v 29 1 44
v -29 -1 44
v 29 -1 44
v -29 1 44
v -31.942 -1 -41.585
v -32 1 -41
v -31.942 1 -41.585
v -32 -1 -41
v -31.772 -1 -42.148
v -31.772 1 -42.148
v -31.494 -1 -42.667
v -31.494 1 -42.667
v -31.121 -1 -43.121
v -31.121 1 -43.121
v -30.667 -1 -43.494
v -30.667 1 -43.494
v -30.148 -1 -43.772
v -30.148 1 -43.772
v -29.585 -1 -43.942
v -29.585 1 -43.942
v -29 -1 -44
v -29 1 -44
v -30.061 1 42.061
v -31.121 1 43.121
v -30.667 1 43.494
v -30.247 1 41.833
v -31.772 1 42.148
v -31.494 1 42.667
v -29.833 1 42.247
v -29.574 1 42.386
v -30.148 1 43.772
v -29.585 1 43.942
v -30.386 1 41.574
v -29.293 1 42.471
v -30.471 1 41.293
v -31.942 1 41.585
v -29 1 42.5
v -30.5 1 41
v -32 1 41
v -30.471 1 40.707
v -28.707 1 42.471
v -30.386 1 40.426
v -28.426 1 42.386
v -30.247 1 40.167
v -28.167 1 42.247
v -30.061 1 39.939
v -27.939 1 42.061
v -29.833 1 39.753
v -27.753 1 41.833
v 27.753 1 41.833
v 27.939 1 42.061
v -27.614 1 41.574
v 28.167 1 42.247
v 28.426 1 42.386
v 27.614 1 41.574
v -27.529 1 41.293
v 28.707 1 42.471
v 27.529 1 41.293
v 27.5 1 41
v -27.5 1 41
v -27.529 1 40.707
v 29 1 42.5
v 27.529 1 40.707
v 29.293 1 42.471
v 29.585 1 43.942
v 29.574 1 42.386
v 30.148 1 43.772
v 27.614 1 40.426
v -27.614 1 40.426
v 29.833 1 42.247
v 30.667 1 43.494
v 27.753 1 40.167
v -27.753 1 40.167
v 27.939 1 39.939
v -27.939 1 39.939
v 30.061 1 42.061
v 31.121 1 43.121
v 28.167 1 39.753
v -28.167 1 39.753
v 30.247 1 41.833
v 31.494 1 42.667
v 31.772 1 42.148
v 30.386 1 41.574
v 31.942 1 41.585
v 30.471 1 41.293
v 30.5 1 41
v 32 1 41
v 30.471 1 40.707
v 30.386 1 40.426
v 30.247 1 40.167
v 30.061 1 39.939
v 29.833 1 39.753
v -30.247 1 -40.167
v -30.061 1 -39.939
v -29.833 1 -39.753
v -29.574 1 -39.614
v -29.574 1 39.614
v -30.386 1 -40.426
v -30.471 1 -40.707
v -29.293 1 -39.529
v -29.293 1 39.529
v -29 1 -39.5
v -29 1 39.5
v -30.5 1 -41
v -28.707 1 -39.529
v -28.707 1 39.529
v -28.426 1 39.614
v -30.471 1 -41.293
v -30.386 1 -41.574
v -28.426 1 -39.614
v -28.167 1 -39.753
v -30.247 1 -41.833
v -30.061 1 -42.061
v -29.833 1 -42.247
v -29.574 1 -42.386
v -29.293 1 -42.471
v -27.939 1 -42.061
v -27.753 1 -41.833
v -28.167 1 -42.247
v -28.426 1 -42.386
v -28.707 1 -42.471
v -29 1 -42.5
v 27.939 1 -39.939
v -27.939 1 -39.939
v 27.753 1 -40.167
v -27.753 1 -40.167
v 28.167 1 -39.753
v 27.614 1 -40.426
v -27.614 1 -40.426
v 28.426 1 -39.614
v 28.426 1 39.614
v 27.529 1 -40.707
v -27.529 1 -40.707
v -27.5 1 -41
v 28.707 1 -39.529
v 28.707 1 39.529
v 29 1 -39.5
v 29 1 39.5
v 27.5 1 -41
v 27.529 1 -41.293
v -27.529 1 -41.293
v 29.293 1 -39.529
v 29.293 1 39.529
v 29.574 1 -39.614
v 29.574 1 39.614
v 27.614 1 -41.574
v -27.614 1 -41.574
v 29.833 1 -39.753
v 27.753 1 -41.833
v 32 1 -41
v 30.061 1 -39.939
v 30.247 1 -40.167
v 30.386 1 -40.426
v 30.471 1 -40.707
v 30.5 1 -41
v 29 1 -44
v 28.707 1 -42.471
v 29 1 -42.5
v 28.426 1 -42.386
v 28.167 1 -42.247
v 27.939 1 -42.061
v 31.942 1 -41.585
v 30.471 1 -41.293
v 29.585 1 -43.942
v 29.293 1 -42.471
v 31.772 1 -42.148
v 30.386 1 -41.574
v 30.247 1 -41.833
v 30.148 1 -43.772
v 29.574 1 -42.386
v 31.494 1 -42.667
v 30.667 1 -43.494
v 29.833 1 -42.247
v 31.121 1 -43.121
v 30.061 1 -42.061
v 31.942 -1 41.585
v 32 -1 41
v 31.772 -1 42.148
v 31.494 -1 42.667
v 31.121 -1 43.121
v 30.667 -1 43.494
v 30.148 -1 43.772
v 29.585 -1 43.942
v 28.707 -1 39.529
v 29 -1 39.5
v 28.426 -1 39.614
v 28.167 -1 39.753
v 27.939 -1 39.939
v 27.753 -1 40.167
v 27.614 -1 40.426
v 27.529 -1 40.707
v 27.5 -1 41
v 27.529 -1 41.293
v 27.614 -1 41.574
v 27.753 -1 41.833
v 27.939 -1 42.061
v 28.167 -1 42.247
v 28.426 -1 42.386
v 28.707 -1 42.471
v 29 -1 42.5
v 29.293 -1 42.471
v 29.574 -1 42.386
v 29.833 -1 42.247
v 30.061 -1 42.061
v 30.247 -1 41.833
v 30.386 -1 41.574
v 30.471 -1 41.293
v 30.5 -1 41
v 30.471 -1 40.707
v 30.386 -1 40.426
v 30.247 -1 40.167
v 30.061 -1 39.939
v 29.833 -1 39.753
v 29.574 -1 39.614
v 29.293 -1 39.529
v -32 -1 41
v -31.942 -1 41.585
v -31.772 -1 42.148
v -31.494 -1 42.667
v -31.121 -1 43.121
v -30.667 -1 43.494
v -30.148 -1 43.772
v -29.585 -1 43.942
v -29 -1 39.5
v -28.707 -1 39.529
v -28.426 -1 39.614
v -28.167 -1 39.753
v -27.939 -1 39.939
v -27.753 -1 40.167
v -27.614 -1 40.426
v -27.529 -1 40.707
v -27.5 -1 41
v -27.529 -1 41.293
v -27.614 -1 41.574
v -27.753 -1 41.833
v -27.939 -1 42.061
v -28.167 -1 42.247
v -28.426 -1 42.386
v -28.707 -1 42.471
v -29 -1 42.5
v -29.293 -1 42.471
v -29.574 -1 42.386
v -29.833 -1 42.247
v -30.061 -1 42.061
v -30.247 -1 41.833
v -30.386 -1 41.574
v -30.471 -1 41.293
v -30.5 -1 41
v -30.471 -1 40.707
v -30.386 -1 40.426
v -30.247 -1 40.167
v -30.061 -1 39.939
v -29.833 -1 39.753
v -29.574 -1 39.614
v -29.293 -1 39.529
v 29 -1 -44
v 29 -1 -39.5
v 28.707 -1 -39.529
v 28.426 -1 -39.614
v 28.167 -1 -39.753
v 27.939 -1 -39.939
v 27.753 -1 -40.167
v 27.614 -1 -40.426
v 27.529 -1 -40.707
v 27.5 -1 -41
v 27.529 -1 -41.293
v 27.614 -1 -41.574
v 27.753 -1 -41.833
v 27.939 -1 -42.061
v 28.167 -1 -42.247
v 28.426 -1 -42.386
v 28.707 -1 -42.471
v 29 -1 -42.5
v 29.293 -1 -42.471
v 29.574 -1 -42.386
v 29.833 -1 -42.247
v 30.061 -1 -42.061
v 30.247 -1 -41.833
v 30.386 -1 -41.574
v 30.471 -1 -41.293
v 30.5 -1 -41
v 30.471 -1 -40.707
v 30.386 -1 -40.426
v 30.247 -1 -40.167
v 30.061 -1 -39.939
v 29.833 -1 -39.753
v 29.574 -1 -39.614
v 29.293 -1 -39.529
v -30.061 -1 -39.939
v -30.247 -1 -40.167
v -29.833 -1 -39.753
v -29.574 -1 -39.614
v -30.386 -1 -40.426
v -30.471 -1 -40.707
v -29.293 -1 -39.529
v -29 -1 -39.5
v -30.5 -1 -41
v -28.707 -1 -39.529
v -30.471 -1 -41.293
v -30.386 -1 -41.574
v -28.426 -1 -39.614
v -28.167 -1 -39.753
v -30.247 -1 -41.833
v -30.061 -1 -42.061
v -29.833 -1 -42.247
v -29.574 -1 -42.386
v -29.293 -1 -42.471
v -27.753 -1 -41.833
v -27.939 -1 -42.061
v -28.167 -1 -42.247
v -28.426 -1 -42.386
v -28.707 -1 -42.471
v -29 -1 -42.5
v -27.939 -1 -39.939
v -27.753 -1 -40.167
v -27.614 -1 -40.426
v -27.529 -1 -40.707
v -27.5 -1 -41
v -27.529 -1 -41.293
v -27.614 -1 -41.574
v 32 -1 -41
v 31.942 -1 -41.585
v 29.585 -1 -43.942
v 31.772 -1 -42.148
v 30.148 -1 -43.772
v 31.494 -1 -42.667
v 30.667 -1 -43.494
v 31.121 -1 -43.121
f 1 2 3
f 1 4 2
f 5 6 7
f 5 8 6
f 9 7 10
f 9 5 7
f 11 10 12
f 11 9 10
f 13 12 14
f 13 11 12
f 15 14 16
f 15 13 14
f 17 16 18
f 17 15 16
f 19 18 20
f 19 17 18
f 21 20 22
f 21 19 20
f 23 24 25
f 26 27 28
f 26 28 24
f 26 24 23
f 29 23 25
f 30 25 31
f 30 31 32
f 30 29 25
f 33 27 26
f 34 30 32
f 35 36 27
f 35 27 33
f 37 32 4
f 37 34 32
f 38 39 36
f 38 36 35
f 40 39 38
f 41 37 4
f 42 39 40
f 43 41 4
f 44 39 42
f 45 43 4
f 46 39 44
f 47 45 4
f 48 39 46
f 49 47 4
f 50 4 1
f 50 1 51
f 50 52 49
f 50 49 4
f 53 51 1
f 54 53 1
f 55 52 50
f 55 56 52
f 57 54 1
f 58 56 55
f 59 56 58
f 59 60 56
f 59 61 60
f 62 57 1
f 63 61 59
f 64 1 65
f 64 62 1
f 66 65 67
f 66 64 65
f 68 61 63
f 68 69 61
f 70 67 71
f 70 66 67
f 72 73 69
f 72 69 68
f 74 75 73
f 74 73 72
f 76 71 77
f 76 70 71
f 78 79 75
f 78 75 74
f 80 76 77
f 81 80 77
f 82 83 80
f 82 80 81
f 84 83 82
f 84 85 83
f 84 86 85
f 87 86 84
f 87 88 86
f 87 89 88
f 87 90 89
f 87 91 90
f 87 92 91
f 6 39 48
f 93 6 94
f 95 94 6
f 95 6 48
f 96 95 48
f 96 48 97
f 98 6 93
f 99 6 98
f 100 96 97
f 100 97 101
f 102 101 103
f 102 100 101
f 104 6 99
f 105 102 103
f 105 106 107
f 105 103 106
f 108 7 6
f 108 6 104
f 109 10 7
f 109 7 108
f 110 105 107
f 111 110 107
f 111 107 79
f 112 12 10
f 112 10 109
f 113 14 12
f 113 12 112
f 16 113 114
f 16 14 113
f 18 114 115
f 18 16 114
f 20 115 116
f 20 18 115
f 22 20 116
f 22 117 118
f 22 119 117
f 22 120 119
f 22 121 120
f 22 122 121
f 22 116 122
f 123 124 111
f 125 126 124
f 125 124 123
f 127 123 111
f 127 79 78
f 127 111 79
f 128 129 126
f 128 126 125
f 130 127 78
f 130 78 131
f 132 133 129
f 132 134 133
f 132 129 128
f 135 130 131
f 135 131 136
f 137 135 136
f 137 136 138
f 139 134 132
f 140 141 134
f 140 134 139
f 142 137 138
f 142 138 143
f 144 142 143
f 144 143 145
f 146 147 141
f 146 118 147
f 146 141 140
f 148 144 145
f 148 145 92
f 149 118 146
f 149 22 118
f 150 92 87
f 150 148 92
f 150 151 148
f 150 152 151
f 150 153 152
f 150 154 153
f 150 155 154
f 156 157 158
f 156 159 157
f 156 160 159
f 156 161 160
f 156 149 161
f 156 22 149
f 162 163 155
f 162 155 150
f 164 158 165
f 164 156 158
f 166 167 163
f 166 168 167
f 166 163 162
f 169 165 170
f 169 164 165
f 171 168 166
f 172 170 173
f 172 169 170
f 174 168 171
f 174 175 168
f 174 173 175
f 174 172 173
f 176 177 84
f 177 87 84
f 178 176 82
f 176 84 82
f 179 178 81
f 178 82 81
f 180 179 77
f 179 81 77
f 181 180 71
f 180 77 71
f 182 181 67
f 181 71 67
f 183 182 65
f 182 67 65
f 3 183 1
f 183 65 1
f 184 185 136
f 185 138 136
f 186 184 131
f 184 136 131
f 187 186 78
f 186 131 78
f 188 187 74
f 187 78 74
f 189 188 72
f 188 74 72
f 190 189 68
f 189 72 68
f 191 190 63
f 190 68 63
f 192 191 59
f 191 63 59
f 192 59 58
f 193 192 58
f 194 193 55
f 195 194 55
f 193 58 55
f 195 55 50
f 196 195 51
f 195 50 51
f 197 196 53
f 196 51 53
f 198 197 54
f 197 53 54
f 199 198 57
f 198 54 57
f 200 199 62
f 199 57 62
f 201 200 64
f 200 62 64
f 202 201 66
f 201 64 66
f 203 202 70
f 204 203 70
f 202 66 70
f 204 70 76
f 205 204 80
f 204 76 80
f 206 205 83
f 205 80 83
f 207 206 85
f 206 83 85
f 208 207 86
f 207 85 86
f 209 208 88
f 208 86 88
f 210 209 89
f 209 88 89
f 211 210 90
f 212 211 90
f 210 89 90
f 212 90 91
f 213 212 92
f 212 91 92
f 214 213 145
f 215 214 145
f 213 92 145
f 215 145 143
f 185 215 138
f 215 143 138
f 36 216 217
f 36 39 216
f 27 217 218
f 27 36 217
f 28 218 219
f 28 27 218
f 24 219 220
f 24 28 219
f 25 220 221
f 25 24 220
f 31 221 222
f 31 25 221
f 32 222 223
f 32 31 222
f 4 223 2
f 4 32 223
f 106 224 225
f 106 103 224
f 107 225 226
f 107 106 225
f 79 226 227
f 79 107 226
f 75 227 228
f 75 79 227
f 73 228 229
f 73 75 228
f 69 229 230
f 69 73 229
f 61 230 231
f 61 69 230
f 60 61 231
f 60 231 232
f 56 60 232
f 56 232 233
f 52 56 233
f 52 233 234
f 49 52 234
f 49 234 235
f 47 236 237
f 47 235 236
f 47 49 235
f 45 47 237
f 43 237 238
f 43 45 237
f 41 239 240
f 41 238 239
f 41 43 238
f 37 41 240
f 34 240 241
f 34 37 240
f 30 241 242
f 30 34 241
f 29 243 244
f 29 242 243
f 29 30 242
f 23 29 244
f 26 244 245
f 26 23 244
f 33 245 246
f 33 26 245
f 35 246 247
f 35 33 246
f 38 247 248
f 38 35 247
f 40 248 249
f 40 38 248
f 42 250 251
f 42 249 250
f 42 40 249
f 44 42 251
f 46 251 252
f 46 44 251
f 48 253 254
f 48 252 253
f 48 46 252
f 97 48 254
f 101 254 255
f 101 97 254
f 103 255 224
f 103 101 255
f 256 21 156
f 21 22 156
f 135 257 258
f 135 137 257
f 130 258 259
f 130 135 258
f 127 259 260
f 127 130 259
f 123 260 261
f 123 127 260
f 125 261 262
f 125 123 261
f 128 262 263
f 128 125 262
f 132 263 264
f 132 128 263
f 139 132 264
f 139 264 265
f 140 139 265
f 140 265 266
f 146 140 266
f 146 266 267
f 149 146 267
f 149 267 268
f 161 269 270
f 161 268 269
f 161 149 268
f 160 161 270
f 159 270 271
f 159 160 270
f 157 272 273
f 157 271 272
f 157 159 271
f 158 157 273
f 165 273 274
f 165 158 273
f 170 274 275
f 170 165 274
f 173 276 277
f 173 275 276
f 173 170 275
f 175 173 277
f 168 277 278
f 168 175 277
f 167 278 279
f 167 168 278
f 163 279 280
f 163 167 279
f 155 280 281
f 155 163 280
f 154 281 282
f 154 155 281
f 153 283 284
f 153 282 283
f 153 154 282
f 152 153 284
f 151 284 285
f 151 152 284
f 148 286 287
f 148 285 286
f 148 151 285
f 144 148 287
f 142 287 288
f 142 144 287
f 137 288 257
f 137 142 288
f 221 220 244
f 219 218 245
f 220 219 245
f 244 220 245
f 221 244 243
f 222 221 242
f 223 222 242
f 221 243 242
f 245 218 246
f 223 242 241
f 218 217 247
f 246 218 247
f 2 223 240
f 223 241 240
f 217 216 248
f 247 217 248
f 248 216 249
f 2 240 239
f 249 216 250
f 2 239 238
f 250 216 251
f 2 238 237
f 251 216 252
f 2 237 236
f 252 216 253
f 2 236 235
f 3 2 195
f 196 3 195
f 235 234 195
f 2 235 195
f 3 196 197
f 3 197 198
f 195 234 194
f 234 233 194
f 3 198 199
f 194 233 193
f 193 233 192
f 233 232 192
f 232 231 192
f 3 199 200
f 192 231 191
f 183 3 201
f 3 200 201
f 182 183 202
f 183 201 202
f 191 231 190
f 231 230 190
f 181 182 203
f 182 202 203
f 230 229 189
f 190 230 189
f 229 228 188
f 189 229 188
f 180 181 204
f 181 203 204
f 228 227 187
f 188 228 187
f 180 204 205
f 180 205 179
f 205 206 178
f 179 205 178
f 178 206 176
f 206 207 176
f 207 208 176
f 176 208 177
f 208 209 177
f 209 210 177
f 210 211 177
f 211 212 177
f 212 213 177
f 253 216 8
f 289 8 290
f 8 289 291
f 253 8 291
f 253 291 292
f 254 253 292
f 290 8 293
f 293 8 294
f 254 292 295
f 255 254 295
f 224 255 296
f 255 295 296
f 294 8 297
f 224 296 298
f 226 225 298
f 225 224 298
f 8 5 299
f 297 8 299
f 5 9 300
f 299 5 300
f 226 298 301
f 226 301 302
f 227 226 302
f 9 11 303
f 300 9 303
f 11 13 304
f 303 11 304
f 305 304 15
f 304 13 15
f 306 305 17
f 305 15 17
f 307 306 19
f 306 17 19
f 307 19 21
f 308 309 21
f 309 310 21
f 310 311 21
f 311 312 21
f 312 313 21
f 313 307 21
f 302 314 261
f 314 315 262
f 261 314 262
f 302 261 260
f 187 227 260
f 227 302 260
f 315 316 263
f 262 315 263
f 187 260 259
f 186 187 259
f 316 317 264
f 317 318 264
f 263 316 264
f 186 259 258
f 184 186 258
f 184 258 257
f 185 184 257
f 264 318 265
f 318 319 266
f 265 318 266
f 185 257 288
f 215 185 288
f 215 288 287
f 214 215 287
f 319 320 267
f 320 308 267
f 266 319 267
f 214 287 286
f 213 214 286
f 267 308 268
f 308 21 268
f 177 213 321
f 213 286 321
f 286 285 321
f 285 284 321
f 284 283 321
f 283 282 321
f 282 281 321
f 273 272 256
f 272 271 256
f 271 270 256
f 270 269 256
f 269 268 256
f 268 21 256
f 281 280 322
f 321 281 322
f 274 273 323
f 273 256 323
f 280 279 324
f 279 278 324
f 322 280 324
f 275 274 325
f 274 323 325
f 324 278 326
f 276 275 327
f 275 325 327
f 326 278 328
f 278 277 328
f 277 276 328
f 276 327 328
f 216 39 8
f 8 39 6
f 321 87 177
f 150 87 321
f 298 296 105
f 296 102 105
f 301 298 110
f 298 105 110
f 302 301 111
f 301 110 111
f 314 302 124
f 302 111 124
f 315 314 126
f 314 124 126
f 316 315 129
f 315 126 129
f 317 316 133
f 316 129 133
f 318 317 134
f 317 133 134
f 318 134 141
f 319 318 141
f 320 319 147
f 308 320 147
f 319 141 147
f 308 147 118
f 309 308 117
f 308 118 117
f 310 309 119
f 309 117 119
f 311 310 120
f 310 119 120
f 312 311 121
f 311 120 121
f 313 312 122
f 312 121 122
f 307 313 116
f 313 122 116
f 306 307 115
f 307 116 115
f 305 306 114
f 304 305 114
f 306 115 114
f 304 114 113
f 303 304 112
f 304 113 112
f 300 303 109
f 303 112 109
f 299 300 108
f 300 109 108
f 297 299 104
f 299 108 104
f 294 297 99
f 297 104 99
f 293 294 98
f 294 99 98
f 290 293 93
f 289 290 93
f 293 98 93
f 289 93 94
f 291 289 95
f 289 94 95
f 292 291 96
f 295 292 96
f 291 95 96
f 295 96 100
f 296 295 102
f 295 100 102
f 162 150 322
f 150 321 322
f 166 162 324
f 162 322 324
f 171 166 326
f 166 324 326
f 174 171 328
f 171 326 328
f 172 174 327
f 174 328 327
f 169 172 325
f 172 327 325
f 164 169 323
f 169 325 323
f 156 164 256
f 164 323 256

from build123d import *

# Parameters (mm, degrees)
SKETCH1_W               = 64
SKETCH1_H               = 88
BOSS_EXTRUDE1_DEPTH     = 1
FILLET1_R               = 3
SKETCH2_R               = 1.5
CUT_EXTRUDE1_DEPTH      = 55.442630355
MIRROR2_COPY_1_SKETCH_R = 1.5
MIRROR2_COPY_1_DEPTH    = 55.442630355


with BuildPart() as part:
    # Sketch1 → Boss-Extrude1 (new, symmetric)
    with BuildSketch(Plane(origin=(0, 0, 0), x_dir=(1, 0, 0), z_dir=(0, 1, 0))):
        Rectangle(SKETCH1_W, SKETCH1_H)
    extrude(amount=BOSS_EXTRUDE1_DEPTH, both=True)

    # Fillet1
    fillet1_edges = [part.edges().sort_by_distance(p)[0] for p in [
        (32, 0, 44),
        (-32, 0, 44),
        (-32, 0, -44),
        (32, 0, -44),
    ]]
    fillet(fillet1_edges, radius=FILLET1_R)

    # Sketch2 → Cut-Extrude1 (cut, symmetric)
    with BuildSketch(Plane(origin=(0, 1, 0), x_dir=(1, 0, 0), z_dir=(0, 1, 0))):
        with Locations(Location((-29, 41, 0), (0, 0, 270))):
            Circle(SKETCH2_R)
    cut_extrude1 = extrude(amount=CUT_EXTRUDE1_DEPTH, both=True, mode=Mode.SUBTRACT)

    # Mirror1: Cut-Extrude1 across plane
    add(cut_extrude1.mirror(Plane(origin=(0, 0, 0), x_dir=(0, 0, 1), z_dir=(1, 0, 0))), mode=Mode.SUBTRACT)

    # Mirror2: Cut-Extrude1 across plane
    add(cut_extrude1.mirror(Plane.XY), mode=Mode.SUBTRACT)

    # Mirror2 copy 1 sketch → Mirror2 copy 1 (cut, symmetric)
    with BuildSketch(Plane(origin=(0, 1, 0), x_dir=(-1, 0, 0), z_dir=(0, 1, 0))):
        with Locations(Location((-29, 41, 0), (0, 0, 270))):
            Circle(MIRROR2_COPY_1_SKETCH_R)
    extrude(amount=MIRROR2_COPY_1_DEPTH, both=True, mode=Mode.SUBTRACT)


solid = part.part
